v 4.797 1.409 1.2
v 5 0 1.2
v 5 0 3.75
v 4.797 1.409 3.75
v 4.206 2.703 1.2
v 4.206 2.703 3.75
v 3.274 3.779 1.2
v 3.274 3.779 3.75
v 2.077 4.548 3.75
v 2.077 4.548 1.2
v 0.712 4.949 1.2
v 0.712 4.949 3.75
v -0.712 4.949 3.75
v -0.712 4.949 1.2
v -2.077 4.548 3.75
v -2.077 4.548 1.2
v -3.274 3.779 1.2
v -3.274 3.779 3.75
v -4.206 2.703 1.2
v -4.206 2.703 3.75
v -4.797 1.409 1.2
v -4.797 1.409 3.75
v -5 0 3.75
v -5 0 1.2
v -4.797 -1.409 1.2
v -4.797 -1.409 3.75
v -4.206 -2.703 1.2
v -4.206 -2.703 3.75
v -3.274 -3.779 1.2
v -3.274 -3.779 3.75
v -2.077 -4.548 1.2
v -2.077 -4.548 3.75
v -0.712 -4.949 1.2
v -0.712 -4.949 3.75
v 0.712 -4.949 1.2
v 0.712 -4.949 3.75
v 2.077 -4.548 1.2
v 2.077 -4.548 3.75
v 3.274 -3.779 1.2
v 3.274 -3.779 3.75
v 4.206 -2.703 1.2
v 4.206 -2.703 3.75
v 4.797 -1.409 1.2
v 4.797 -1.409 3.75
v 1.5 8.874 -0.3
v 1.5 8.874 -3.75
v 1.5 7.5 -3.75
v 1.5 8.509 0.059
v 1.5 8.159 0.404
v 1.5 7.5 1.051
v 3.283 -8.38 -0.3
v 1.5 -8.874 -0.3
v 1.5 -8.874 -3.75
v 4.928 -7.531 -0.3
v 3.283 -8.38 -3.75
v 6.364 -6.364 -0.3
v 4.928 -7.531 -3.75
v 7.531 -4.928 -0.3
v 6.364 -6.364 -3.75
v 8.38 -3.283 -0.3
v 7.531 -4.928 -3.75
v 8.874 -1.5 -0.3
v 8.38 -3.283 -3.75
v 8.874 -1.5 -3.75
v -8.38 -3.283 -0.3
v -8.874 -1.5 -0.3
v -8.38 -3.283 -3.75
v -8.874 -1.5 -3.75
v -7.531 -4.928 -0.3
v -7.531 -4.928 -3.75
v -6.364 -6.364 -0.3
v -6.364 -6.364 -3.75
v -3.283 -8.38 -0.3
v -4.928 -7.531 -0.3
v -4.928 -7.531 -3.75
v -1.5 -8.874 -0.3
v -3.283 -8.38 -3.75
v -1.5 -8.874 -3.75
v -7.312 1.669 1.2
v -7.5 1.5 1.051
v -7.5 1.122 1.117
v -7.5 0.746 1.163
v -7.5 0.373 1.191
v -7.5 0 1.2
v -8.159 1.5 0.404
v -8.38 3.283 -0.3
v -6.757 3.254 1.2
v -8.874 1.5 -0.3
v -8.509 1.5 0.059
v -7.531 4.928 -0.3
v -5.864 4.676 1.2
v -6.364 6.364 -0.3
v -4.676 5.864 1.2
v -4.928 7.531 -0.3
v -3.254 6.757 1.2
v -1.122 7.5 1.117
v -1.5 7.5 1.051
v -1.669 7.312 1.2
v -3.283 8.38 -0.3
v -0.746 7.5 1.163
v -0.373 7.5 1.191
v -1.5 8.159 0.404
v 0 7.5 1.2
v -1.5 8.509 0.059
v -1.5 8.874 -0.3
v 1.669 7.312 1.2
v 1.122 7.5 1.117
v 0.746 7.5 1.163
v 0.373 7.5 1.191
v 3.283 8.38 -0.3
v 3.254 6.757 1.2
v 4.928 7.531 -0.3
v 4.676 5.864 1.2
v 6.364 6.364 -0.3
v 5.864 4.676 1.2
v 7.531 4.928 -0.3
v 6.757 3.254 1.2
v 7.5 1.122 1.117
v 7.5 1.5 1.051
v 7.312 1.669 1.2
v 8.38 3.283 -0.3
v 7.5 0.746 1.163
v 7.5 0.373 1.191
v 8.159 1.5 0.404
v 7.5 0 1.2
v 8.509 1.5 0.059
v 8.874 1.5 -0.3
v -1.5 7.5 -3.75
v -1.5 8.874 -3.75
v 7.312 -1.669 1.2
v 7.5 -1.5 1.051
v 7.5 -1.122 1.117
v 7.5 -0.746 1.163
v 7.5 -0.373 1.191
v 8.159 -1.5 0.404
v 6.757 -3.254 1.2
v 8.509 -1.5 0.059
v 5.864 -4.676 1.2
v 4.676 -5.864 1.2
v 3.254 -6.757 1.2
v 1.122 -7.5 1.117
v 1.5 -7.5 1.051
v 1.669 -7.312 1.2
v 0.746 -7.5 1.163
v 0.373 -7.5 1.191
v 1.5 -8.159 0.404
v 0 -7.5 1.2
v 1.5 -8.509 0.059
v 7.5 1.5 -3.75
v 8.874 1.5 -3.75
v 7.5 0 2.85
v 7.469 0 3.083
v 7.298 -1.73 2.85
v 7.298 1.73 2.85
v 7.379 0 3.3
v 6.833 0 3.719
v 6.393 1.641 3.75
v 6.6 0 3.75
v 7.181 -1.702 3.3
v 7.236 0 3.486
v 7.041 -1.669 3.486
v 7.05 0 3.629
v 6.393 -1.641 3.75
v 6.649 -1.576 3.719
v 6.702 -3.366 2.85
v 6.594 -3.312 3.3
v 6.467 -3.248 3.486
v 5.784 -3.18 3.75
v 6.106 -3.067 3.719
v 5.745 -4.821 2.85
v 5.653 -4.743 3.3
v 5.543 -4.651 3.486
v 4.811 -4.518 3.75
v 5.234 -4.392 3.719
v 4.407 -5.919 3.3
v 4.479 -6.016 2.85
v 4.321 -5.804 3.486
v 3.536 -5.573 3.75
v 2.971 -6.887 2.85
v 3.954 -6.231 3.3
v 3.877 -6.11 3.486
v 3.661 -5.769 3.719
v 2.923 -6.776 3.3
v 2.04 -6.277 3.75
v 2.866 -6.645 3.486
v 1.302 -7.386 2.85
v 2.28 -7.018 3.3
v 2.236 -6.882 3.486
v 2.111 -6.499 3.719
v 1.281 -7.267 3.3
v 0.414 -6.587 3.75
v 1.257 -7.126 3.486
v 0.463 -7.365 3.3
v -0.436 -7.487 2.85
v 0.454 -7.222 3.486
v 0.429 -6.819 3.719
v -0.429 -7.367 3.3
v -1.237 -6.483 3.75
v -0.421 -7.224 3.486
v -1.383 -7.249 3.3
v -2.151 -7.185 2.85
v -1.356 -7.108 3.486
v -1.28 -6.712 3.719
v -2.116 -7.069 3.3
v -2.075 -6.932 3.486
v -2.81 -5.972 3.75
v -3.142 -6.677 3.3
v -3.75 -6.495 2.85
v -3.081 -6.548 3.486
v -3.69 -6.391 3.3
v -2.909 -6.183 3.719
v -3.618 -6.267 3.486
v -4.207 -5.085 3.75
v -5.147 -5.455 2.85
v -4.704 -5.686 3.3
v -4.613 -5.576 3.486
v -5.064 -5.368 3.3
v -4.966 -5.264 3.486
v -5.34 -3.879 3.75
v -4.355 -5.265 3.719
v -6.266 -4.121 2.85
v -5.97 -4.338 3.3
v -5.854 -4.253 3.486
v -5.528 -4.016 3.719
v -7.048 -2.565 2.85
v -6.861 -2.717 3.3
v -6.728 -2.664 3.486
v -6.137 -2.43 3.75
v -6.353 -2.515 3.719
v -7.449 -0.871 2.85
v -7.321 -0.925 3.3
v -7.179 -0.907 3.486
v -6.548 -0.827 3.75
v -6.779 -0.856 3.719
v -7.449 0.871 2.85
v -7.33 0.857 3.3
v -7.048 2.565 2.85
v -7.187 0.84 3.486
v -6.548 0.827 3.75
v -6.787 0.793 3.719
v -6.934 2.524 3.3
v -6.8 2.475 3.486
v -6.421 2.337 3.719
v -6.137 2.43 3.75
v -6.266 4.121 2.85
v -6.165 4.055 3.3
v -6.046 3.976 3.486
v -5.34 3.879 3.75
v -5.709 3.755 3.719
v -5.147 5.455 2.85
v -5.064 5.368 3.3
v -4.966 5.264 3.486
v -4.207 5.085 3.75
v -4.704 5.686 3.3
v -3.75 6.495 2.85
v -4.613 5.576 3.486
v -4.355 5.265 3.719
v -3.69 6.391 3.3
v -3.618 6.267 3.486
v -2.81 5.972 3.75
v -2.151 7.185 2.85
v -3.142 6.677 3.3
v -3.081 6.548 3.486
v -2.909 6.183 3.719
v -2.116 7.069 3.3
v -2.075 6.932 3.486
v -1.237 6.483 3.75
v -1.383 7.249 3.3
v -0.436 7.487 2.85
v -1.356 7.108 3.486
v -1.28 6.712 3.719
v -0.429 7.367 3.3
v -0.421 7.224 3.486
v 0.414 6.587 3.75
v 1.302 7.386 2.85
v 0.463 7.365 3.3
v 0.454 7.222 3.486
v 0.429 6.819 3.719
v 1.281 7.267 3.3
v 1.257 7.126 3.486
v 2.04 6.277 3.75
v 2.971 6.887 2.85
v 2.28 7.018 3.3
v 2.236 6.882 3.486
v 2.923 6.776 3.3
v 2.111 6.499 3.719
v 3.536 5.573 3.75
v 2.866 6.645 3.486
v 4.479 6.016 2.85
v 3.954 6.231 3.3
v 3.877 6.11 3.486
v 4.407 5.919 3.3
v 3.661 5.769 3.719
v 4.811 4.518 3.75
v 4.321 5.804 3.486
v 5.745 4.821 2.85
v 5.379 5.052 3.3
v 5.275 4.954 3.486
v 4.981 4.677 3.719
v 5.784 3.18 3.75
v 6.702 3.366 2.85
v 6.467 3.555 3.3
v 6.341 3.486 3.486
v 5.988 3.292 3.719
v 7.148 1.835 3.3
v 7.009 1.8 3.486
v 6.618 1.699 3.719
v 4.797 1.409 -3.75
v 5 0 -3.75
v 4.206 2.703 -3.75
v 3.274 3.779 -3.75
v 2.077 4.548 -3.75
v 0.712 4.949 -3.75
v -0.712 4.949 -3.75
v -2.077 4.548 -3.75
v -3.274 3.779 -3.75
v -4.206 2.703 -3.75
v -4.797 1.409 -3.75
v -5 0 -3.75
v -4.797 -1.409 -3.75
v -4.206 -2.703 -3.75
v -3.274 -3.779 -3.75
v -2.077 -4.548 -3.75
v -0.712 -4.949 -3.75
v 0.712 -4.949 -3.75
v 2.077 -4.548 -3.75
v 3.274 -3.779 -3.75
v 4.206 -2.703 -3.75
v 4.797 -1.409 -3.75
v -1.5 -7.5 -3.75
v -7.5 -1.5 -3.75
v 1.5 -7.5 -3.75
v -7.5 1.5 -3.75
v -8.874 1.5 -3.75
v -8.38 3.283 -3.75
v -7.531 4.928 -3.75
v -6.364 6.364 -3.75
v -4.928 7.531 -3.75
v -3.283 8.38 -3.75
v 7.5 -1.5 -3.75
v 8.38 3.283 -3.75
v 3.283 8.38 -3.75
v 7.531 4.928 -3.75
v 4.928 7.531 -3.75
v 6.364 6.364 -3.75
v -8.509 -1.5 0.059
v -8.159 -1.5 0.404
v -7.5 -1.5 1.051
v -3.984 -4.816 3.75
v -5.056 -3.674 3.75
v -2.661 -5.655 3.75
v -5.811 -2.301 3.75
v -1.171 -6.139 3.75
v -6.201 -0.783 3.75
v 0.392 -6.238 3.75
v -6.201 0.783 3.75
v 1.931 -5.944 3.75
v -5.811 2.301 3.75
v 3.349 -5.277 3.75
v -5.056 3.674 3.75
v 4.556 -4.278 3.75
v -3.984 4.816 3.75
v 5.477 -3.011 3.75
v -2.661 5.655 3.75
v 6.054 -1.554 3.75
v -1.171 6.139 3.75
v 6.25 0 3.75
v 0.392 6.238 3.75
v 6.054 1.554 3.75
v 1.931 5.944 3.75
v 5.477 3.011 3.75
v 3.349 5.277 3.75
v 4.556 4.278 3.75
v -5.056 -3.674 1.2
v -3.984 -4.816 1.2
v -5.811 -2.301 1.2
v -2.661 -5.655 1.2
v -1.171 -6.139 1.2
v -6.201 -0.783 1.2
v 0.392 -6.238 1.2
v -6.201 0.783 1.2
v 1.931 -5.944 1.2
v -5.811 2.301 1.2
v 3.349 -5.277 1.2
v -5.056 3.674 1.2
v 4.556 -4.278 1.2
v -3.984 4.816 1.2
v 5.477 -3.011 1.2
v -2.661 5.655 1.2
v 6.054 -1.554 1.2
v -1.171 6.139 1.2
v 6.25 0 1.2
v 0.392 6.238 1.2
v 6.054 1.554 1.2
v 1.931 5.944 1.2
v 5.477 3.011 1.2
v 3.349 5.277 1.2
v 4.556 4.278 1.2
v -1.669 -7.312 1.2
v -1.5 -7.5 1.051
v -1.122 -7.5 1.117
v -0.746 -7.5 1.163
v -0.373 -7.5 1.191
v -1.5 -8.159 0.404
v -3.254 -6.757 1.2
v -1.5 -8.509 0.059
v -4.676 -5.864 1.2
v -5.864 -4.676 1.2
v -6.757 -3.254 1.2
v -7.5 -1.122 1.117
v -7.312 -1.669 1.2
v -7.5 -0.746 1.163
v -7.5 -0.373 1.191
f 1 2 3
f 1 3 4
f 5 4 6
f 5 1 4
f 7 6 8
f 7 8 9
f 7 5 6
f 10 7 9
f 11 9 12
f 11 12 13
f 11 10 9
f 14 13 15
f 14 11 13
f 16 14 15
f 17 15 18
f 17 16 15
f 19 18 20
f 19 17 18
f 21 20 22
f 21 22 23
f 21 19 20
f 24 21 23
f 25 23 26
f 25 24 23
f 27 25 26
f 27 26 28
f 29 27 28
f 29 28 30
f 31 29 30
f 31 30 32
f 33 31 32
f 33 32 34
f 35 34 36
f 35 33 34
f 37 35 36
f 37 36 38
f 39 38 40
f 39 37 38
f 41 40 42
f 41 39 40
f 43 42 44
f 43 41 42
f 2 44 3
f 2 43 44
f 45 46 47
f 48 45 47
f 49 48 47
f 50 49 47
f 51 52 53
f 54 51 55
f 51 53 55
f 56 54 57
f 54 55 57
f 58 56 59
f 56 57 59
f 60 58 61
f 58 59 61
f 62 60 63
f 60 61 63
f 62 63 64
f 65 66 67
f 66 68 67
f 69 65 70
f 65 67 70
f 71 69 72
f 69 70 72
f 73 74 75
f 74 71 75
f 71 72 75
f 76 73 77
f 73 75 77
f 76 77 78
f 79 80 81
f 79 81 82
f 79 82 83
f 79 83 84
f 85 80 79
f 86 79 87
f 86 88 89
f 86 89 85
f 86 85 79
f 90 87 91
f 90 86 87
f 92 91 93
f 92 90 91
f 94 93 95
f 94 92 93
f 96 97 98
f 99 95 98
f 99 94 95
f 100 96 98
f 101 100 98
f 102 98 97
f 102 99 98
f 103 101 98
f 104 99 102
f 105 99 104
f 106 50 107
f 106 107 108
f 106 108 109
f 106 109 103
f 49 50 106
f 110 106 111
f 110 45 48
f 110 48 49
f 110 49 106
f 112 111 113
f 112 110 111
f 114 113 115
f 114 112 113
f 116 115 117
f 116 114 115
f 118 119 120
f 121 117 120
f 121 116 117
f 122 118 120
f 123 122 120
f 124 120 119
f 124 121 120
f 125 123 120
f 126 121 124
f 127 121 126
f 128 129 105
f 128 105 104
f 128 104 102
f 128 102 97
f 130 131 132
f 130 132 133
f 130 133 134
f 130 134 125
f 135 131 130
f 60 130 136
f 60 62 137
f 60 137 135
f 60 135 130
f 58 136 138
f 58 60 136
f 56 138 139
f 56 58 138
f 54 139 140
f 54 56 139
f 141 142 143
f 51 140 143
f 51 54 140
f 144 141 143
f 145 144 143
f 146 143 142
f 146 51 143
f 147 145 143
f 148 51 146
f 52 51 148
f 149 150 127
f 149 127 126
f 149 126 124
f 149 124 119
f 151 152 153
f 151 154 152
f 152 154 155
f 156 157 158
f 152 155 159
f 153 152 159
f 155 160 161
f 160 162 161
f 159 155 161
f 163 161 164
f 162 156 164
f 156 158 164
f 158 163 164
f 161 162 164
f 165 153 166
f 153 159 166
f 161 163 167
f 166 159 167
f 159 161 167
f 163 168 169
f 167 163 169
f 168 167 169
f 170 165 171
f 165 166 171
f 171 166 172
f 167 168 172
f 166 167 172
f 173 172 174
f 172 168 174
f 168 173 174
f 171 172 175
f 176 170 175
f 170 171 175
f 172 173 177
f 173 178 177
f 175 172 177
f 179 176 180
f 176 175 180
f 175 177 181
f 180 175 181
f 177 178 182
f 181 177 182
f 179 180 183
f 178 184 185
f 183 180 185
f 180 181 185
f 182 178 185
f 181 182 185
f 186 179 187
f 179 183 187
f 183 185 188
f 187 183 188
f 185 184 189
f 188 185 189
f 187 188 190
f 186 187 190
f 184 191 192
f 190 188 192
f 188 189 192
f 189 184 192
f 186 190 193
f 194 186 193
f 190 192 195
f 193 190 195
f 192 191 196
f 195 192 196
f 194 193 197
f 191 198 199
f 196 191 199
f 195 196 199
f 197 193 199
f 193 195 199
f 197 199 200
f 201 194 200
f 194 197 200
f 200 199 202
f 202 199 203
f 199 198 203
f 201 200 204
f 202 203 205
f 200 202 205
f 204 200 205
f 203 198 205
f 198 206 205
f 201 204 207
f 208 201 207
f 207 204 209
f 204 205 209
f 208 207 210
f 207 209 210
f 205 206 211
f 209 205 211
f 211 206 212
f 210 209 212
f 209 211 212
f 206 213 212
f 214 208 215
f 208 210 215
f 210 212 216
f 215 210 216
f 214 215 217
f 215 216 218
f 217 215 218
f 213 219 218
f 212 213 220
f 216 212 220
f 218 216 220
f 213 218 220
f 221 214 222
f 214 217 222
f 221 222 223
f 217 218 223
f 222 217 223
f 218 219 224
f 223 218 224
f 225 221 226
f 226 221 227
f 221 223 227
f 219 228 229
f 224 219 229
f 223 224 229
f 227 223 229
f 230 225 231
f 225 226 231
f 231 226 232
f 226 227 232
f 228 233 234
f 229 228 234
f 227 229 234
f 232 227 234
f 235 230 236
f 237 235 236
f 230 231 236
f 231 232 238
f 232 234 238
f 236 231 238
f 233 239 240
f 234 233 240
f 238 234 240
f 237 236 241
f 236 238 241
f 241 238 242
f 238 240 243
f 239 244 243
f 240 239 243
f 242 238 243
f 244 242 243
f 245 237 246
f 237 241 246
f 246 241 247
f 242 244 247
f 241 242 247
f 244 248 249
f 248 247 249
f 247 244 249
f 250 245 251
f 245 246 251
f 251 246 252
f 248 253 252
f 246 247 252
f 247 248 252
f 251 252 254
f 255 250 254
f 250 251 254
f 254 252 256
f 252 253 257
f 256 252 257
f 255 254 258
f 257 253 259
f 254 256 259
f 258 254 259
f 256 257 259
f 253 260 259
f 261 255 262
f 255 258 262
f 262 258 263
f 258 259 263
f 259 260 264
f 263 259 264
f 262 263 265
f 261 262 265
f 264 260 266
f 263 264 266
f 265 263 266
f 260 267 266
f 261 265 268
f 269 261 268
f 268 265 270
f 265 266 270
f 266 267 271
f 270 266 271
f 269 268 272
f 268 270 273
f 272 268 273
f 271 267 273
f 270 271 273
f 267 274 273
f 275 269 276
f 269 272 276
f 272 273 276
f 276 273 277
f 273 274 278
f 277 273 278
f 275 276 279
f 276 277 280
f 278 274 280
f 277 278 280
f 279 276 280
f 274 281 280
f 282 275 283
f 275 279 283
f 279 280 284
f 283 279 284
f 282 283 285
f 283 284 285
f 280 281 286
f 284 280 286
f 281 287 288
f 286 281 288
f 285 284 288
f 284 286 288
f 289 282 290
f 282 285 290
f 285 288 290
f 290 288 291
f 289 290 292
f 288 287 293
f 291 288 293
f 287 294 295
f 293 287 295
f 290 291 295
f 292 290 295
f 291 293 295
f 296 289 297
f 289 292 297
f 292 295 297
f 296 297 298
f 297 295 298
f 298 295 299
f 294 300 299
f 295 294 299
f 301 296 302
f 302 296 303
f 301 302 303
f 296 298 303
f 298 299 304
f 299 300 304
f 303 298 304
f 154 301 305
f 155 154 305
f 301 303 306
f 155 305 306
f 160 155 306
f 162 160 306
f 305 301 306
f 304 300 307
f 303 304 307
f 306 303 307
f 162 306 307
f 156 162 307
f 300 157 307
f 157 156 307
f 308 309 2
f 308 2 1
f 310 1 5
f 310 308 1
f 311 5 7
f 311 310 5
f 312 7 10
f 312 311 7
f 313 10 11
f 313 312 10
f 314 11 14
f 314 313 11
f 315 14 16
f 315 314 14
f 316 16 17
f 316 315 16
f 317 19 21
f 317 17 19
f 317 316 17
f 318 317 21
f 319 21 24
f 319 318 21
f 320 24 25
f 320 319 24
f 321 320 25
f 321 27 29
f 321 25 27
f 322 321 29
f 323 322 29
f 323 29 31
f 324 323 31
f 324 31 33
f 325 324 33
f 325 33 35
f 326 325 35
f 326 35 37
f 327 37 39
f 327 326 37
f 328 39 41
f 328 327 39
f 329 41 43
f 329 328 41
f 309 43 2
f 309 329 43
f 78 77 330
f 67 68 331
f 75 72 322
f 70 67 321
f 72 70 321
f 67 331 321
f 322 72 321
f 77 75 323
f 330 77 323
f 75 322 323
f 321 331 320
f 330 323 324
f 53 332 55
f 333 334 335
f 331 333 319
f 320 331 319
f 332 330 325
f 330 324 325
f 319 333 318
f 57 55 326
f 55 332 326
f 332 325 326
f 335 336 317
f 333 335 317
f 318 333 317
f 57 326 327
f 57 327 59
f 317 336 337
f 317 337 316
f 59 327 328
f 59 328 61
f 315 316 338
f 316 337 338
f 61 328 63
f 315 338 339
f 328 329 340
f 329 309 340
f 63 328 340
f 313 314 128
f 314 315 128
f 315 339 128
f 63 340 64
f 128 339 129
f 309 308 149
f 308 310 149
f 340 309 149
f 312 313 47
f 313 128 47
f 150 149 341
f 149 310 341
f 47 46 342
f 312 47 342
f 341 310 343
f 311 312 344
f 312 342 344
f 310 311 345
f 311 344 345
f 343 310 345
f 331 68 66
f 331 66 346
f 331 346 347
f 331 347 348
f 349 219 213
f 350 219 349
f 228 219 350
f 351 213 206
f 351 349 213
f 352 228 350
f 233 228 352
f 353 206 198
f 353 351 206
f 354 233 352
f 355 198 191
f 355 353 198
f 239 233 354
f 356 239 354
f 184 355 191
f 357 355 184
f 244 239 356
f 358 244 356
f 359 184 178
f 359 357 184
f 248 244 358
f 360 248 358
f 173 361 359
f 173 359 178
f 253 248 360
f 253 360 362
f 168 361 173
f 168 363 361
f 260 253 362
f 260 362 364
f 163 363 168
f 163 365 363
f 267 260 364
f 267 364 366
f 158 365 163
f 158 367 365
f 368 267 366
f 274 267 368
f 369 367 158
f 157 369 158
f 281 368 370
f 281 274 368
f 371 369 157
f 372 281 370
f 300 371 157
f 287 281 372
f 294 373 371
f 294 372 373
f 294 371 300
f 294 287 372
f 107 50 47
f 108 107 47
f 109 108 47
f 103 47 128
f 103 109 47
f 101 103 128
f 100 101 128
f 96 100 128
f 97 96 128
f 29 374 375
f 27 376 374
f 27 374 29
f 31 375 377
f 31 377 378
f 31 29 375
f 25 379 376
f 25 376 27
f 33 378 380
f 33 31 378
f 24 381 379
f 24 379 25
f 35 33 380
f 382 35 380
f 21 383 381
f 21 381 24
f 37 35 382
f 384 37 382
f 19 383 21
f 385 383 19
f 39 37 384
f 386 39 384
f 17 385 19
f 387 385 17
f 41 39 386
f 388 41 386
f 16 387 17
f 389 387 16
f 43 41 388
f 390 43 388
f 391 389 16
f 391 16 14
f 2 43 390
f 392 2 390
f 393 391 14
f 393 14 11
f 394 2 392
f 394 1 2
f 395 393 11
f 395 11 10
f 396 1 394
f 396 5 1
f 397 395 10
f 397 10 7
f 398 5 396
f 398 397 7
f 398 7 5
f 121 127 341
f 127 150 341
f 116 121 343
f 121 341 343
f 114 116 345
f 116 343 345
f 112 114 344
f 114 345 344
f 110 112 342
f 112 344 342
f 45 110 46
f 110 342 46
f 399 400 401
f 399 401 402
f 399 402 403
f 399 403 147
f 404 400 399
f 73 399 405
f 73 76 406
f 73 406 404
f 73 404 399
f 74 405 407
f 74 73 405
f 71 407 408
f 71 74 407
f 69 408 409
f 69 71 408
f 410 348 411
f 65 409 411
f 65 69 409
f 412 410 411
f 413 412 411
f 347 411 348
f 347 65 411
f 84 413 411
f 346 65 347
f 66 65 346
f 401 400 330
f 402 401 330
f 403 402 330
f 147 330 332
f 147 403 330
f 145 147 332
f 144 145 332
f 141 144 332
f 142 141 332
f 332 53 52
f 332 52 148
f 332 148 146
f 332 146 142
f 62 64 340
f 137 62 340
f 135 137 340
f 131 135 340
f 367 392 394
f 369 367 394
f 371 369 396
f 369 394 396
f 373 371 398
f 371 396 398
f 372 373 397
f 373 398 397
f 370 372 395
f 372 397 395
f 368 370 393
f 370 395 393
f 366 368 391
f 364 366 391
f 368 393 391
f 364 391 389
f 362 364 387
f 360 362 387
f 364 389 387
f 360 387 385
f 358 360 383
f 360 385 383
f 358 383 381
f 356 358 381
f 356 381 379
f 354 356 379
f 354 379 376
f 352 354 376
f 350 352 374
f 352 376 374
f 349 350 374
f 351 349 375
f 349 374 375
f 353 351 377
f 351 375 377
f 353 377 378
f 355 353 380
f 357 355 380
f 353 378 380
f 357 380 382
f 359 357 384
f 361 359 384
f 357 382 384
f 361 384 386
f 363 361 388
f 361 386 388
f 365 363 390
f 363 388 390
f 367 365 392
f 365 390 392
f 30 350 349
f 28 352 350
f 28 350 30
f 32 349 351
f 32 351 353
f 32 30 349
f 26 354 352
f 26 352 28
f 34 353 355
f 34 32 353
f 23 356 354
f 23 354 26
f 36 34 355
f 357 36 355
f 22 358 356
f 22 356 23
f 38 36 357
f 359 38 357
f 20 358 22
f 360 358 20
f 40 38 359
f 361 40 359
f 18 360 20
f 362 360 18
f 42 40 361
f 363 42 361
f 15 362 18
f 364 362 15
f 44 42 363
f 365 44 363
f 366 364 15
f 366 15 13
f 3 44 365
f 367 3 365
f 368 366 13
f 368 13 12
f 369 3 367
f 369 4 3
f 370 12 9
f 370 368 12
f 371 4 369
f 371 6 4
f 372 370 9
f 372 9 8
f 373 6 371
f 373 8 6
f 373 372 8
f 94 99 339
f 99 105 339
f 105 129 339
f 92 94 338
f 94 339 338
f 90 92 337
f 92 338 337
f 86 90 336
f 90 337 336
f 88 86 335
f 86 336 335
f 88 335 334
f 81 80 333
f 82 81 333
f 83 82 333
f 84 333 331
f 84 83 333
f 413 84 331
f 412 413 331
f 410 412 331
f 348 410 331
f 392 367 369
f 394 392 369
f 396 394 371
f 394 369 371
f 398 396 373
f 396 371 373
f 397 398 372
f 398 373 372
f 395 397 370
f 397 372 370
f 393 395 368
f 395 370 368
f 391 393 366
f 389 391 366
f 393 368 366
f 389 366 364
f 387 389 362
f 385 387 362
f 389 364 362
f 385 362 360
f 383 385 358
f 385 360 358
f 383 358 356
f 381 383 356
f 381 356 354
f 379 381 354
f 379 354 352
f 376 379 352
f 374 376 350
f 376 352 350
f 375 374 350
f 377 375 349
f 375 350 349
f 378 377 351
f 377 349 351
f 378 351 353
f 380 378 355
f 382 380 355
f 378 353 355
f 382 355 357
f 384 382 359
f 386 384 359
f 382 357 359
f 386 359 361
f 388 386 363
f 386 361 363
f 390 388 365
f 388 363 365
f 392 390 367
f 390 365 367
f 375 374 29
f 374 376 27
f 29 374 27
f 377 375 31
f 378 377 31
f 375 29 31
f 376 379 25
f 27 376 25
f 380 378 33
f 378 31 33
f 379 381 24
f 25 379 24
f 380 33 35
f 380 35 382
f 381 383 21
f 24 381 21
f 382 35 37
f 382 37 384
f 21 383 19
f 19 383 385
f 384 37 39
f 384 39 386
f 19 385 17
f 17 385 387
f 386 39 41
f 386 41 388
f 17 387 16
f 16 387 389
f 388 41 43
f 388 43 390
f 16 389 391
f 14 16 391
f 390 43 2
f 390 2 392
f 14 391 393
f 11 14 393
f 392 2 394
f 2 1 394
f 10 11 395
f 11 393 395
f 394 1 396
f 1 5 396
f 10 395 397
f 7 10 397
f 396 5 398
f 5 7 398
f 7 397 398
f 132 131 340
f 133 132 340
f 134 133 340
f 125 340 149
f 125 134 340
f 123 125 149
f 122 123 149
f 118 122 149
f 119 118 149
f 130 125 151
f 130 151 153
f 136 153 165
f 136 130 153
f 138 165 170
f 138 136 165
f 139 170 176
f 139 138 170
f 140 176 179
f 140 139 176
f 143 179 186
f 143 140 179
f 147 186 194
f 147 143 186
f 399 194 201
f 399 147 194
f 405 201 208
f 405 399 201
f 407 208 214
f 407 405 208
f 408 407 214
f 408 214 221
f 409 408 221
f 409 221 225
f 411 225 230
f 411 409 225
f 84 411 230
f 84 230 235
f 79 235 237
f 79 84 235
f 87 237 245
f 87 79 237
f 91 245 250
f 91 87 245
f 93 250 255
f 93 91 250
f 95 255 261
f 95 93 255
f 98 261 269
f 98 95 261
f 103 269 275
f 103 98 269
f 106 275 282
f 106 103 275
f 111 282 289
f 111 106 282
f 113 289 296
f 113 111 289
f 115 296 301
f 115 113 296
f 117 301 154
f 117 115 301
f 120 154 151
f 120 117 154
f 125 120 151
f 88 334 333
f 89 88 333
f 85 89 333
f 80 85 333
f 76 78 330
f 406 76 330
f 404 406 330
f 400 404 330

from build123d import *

# Parameters (mm, degrees)
BOSS_EXTRUDE1_DEPTH      = 3.75
BOSS_EXTRUDE1_DEPTH_BACK = 3.75
SKETCH4_R                = 9
SKETCH4_R_2              = 5
SKETCH5_R                = 9
SKETCH5_R_2              = 7.5
CUT_EXTRUDE1_DEPTH       = 0.5
SKETCH16_W               = 3
SKETCH16_H               = 1.5
CUT_EXTRUDE7_DEPTH       = 14.26885451
CIRPATTERN1_COUNT        = 4
FILLET1_R                = 0.9
SKETCH19_R               = 6.25
CUT_EXTRUDE8_DEPTH       = 2.55
SKETCH20_R               = 6.25
SKETCH20_R_2             = 5
BOSS_EXTRUDE2_DEPTH      = 2.55


with BuildPart() as part:
    # Sketch4 → Boss-Extrude1 (new, two sides: drawn at the far end of the back side and taken through both)
    with BuildSketch(Plane.XY.offset(-BOSS_EXTRUDE1_DEPTH_BACK)):
        Circle(SKETCH4_R)
        Circle(SKETCH4_R_2, mode=Mode.SUBTRACT)
    extrude(amount=BOSS_EXTRUDE1_DEPTH + BOSS_EXTRUDE1_DEPTH_BACK)

    # Sketch5 → Cut-Extrude1 (cut)
    with BuildSketch(Plane.XY.offset(3.75)):
        Circle(SKETCH5_R)
        Circle(SKETCH5_R_2, mode=Mode.SUBTRACT)
    extrude(amount=-CUT_EXTRUDE1_DEPTH, mode=Mode.SUBTRACT)

    # Sketch16 → Cut-Extrude7 (cut, symmetric)
    with BuildSketch(Plane.XY):
        with Locations((0, -8.25)):
            Rectangle(SKETCH16_W, SKETCH16_H)
    cut_extrude7 = extrude(amount=CUT_EXTRUDE7_DEPTH, both=True, mode=Mode.SUBTRACT)

    # CirPattern1: Cut-Extrude7 ×4 about axis
    cirpattern1_axis = Axis((0, 0, 0), (0, 0, 1))
    for i in range(1, CIRPATTERN1_COUNT):
        add(cut_extrude7.rotate(cirpattern1_axis, i * 360 / CIRPATTERN1_COUNT), mode=Mode.SUBTRACT)

    # Sketch18 → Cut-Revolve1 (revolve, cut)
    with BuildSketch(Plane(origin=(0, 0, 0), x_dir=(0, 0, -1), z_dir=(1, 0, 0)), mode=Mode.PRIVATE) as cut_revolve1_sk:
        Polygon((-1.2, 7.5), (0.3, 9), (-3.75, 9), (-3.75, 7.5), align=None)
    revolve(cut_revolve1_sk.sketch.rotate(Axis((0, 0, 3.75), (0, 0, -1)), 90), axis=Axis((0, 0, 3.75), (0, 0, -1)), mode=Mode.SUBTRACT)

    # Fillet1
    fillet1_edges = [part.edges().sort_by_distance(p)[0] for p in [
        (-7.5, 0, 3.75),
    ]]
    fillet(fillet1_edges, radius=FILLET1_R)

    # Sketch19 → Cut-Extrude8 (cut)
    with BuildSketch(Plane.XY.offset(3.75)):
        Circle(SKETCH19_R)
    extrude(amount=-CUT_EXTRUDE8_DEPTH, mode=Mode.SUBTRACT)


with BuildPart() as body_2:
    # Sketch20 → Boss-Extrude2 (new body)
    with BuildSketch(Plane.XY.offset(1.2)):
        Circle(SKETCH20_R)
        Circle(SKETCH20_R_2, mode=Mode.SUBTRACT)
    extrude(amount=BOSS_EXTRUDE2_DEPTH)


solid = Compound([part.part, body_2.part])
